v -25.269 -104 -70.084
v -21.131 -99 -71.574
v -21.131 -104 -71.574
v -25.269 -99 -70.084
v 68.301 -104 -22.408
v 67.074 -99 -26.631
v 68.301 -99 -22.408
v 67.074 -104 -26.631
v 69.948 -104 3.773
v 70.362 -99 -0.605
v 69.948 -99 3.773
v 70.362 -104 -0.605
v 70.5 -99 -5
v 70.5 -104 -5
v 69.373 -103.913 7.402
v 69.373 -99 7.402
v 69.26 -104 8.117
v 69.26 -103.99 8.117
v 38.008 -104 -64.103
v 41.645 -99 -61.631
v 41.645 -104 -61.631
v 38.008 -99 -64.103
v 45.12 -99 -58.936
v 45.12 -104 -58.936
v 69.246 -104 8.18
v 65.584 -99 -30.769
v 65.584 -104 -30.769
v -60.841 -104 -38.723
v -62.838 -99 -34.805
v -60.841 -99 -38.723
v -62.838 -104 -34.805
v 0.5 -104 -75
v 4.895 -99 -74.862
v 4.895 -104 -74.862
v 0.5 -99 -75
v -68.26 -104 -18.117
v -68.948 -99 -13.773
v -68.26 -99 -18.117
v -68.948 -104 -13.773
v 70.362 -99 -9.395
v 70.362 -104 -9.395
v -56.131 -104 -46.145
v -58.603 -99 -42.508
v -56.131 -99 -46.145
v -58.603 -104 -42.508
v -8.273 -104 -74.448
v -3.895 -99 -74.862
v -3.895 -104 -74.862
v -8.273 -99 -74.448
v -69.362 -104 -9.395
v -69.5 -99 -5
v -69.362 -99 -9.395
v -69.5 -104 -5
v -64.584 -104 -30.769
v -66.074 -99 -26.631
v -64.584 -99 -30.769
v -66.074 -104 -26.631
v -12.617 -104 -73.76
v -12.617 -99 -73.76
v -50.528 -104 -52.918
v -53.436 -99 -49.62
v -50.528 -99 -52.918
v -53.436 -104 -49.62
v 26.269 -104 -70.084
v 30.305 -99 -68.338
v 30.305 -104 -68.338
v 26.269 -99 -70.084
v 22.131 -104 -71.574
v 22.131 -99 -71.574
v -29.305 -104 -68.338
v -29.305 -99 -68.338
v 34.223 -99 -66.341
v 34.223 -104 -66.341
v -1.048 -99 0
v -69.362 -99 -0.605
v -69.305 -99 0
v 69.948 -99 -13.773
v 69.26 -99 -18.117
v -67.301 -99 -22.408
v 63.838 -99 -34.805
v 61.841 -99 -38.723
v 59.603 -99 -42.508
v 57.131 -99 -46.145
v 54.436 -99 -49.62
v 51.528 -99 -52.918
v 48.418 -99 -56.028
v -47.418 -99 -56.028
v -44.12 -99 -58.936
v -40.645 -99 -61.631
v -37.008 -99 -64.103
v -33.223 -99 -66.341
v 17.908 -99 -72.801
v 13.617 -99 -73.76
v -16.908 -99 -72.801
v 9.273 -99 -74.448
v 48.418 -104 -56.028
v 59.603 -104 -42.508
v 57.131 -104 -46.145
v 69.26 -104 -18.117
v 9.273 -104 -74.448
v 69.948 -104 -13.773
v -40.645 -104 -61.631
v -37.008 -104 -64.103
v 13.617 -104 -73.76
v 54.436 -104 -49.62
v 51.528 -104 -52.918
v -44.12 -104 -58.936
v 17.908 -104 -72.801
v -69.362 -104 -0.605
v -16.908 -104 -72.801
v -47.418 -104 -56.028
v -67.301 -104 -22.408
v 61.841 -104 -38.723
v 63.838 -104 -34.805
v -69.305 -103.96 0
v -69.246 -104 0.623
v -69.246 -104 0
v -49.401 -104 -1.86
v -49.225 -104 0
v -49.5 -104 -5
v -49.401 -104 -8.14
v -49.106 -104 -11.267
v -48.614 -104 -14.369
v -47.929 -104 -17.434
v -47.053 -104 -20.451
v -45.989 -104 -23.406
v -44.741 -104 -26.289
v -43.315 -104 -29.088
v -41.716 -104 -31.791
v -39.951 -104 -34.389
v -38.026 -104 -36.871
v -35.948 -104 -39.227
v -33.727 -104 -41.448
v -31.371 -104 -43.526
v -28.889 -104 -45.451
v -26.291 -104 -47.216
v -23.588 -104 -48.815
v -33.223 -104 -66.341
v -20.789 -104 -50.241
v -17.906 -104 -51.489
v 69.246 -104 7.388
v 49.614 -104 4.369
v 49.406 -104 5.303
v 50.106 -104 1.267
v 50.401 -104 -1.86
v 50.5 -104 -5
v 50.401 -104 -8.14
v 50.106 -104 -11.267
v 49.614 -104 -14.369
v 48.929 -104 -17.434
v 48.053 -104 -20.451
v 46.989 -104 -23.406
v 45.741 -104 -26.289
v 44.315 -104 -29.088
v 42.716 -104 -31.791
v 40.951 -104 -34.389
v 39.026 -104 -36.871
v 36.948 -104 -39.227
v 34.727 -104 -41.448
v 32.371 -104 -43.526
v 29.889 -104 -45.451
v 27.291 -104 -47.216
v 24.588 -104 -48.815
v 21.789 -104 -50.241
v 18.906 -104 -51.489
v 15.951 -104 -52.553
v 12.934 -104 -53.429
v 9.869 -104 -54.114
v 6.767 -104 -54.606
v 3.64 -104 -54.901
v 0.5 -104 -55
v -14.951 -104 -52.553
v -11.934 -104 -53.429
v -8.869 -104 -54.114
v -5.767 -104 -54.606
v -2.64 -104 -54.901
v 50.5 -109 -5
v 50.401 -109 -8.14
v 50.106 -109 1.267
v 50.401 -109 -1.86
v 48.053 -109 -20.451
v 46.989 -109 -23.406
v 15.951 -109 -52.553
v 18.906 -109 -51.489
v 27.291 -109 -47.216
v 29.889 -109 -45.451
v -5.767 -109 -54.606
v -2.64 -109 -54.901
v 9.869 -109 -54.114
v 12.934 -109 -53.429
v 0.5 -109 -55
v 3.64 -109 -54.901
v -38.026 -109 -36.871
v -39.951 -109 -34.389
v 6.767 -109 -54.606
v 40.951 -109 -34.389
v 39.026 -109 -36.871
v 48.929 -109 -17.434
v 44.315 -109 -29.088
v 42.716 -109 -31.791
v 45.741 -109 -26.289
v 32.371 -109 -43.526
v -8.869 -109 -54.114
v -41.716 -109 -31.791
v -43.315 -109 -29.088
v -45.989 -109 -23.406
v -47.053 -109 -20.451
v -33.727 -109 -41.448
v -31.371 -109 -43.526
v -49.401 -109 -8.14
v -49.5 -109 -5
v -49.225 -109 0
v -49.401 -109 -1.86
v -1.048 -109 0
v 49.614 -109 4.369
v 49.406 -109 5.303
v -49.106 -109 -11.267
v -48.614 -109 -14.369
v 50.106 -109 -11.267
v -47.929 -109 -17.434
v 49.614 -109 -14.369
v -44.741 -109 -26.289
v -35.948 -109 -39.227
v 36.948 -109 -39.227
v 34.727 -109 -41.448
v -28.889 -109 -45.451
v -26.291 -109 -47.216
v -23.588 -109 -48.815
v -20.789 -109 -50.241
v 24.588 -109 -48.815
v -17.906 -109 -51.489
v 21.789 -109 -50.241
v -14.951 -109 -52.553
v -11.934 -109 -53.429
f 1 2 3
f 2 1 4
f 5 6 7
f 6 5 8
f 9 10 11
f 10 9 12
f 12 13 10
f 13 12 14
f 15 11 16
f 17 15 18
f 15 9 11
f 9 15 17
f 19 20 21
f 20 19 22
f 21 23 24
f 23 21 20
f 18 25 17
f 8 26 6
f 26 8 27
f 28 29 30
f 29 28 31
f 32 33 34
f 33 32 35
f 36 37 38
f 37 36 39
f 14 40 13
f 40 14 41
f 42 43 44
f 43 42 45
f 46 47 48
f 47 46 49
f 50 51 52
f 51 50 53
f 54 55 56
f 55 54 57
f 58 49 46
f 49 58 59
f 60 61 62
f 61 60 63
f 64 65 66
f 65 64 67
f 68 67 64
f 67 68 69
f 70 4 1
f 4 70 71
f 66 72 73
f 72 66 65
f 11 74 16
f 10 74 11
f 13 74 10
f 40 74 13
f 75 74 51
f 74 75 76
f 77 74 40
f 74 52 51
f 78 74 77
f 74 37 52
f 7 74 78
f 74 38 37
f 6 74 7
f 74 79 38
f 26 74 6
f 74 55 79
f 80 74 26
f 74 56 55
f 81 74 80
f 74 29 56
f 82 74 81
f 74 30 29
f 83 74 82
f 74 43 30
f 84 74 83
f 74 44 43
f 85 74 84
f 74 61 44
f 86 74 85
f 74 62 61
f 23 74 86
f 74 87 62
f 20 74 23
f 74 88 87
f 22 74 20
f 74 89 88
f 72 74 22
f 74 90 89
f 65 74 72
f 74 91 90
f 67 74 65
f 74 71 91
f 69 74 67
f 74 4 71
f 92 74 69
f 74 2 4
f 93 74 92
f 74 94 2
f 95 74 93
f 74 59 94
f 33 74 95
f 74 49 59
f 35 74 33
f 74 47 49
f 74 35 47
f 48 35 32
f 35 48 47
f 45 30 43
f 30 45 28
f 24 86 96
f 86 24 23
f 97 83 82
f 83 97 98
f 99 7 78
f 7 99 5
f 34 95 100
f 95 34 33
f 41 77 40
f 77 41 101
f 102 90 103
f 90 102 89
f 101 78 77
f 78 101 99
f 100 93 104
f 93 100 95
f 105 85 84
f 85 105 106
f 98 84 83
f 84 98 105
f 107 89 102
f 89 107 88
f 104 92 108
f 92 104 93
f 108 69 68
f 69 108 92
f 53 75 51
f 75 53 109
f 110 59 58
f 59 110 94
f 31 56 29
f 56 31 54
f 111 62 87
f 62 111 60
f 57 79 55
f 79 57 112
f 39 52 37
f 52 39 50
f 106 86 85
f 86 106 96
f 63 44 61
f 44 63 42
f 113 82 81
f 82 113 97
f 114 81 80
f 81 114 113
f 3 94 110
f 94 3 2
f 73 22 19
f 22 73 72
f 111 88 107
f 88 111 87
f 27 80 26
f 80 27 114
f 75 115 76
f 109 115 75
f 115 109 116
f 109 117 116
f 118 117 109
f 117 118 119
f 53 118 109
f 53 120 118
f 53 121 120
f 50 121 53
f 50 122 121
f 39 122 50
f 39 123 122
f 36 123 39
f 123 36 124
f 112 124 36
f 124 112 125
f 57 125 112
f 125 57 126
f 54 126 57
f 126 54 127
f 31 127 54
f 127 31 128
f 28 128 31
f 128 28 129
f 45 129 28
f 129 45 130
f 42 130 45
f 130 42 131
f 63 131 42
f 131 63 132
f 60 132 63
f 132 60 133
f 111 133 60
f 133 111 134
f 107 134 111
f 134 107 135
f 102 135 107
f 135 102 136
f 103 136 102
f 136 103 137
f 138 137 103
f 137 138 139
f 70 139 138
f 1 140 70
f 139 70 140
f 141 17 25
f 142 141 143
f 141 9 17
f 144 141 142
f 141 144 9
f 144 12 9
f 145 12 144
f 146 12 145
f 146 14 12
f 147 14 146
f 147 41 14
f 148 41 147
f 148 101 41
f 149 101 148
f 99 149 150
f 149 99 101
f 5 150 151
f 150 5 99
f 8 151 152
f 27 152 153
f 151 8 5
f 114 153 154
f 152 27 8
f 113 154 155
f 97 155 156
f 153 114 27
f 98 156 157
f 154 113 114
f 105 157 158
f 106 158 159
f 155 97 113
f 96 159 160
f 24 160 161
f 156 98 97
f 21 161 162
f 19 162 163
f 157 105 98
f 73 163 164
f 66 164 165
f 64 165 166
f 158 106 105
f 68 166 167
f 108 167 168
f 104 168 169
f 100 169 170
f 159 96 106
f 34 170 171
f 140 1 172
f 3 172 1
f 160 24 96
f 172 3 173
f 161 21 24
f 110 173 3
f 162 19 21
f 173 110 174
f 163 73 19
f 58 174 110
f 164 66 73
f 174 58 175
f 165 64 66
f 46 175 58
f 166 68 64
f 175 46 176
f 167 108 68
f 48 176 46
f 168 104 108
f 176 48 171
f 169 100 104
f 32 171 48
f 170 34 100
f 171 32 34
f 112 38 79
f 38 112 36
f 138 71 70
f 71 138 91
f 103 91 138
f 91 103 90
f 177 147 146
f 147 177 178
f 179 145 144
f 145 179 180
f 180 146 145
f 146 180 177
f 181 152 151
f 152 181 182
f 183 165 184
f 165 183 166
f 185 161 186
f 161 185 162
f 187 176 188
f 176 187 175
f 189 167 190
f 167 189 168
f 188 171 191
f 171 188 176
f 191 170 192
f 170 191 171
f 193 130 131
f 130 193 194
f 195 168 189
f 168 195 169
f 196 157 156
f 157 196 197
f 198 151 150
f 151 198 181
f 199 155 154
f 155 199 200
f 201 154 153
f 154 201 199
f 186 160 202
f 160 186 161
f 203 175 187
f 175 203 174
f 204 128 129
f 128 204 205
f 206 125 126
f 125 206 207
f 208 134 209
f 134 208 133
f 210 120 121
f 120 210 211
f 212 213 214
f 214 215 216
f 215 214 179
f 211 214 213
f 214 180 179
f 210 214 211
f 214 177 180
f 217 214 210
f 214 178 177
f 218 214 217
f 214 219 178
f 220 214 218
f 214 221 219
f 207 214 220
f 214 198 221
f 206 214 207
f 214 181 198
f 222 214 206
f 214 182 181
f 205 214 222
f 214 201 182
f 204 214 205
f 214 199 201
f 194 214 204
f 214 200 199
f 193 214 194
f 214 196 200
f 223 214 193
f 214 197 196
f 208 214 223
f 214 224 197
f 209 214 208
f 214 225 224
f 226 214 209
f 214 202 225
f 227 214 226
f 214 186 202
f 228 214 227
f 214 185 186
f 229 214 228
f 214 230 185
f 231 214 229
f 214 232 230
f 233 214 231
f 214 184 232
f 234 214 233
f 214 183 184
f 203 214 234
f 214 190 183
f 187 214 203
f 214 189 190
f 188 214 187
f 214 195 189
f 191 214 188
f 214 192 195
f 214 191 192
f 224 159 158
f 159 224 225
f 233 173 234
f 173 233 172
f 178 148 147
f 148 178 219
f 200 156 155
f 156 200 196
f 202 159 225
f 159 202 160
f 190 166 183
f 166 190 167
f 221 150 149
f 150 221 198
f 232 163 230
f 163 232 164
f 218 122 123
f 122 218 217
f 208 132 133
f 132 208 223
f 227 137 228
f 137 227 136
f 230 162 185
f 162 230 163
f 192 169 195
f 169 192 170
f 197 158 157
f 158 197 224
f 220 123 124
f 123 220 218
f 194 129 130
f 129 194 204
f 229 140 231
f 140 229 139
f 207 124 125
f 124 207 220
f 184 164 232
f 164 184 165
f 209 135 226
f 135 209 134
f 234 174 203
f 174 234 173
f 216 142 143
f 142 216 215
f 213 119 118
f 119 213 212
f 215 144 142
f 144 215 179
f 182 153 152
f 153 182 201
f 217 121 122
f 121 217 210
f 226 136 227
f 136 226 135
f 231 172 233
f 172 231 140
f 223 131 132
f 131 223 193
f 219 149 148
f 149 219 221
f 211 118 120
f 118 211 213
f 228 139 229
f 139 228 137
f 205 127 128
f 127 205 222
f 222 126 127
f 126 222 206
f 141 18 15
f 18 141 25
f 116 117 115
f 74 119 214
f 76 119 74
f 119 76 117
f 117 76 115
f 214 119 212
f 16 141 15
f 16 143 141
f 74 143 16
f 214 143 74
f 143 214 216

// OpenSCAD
DIAMETER = 250;
HEIGHT = 65;
OPENING = 200;
BOTTOM_OPENING = 240;
WALL_THICKNESS = 10;

$fn=100;

difference(){
 
// Earpiece
translate([.5,-99,-5]){
    rotate([90,0,0]){
        cylinder(r=70,h=5);
        translate([0,0,5]){
            cylinder(r=50,h=5);
        }
    }
}

difference(){
    #cylinder(r=DIAMETER/2,h=HEIGHT);
        
    // inner opening
    // TODO: Uncomment this to print the donut
    //cylinder(r=BOTTOM_OPENING/2,h=HEIGHT-WALL_THICKNESS);
    
    // outer opening
    // TODO: Uncomment this when printing the donut
    translate([0,0,10]){
        //sphere(r=OPENING/2);
    }
    
    // bill angle cut
    translate([0,-DIAMETER/2,-WALL_THICKNESS*2]){
        rotate([0,-6,0]){
            cube([DIAMETER,DIAMETER,WALL_THICKNESS*2]);
        }
    }
}
}
